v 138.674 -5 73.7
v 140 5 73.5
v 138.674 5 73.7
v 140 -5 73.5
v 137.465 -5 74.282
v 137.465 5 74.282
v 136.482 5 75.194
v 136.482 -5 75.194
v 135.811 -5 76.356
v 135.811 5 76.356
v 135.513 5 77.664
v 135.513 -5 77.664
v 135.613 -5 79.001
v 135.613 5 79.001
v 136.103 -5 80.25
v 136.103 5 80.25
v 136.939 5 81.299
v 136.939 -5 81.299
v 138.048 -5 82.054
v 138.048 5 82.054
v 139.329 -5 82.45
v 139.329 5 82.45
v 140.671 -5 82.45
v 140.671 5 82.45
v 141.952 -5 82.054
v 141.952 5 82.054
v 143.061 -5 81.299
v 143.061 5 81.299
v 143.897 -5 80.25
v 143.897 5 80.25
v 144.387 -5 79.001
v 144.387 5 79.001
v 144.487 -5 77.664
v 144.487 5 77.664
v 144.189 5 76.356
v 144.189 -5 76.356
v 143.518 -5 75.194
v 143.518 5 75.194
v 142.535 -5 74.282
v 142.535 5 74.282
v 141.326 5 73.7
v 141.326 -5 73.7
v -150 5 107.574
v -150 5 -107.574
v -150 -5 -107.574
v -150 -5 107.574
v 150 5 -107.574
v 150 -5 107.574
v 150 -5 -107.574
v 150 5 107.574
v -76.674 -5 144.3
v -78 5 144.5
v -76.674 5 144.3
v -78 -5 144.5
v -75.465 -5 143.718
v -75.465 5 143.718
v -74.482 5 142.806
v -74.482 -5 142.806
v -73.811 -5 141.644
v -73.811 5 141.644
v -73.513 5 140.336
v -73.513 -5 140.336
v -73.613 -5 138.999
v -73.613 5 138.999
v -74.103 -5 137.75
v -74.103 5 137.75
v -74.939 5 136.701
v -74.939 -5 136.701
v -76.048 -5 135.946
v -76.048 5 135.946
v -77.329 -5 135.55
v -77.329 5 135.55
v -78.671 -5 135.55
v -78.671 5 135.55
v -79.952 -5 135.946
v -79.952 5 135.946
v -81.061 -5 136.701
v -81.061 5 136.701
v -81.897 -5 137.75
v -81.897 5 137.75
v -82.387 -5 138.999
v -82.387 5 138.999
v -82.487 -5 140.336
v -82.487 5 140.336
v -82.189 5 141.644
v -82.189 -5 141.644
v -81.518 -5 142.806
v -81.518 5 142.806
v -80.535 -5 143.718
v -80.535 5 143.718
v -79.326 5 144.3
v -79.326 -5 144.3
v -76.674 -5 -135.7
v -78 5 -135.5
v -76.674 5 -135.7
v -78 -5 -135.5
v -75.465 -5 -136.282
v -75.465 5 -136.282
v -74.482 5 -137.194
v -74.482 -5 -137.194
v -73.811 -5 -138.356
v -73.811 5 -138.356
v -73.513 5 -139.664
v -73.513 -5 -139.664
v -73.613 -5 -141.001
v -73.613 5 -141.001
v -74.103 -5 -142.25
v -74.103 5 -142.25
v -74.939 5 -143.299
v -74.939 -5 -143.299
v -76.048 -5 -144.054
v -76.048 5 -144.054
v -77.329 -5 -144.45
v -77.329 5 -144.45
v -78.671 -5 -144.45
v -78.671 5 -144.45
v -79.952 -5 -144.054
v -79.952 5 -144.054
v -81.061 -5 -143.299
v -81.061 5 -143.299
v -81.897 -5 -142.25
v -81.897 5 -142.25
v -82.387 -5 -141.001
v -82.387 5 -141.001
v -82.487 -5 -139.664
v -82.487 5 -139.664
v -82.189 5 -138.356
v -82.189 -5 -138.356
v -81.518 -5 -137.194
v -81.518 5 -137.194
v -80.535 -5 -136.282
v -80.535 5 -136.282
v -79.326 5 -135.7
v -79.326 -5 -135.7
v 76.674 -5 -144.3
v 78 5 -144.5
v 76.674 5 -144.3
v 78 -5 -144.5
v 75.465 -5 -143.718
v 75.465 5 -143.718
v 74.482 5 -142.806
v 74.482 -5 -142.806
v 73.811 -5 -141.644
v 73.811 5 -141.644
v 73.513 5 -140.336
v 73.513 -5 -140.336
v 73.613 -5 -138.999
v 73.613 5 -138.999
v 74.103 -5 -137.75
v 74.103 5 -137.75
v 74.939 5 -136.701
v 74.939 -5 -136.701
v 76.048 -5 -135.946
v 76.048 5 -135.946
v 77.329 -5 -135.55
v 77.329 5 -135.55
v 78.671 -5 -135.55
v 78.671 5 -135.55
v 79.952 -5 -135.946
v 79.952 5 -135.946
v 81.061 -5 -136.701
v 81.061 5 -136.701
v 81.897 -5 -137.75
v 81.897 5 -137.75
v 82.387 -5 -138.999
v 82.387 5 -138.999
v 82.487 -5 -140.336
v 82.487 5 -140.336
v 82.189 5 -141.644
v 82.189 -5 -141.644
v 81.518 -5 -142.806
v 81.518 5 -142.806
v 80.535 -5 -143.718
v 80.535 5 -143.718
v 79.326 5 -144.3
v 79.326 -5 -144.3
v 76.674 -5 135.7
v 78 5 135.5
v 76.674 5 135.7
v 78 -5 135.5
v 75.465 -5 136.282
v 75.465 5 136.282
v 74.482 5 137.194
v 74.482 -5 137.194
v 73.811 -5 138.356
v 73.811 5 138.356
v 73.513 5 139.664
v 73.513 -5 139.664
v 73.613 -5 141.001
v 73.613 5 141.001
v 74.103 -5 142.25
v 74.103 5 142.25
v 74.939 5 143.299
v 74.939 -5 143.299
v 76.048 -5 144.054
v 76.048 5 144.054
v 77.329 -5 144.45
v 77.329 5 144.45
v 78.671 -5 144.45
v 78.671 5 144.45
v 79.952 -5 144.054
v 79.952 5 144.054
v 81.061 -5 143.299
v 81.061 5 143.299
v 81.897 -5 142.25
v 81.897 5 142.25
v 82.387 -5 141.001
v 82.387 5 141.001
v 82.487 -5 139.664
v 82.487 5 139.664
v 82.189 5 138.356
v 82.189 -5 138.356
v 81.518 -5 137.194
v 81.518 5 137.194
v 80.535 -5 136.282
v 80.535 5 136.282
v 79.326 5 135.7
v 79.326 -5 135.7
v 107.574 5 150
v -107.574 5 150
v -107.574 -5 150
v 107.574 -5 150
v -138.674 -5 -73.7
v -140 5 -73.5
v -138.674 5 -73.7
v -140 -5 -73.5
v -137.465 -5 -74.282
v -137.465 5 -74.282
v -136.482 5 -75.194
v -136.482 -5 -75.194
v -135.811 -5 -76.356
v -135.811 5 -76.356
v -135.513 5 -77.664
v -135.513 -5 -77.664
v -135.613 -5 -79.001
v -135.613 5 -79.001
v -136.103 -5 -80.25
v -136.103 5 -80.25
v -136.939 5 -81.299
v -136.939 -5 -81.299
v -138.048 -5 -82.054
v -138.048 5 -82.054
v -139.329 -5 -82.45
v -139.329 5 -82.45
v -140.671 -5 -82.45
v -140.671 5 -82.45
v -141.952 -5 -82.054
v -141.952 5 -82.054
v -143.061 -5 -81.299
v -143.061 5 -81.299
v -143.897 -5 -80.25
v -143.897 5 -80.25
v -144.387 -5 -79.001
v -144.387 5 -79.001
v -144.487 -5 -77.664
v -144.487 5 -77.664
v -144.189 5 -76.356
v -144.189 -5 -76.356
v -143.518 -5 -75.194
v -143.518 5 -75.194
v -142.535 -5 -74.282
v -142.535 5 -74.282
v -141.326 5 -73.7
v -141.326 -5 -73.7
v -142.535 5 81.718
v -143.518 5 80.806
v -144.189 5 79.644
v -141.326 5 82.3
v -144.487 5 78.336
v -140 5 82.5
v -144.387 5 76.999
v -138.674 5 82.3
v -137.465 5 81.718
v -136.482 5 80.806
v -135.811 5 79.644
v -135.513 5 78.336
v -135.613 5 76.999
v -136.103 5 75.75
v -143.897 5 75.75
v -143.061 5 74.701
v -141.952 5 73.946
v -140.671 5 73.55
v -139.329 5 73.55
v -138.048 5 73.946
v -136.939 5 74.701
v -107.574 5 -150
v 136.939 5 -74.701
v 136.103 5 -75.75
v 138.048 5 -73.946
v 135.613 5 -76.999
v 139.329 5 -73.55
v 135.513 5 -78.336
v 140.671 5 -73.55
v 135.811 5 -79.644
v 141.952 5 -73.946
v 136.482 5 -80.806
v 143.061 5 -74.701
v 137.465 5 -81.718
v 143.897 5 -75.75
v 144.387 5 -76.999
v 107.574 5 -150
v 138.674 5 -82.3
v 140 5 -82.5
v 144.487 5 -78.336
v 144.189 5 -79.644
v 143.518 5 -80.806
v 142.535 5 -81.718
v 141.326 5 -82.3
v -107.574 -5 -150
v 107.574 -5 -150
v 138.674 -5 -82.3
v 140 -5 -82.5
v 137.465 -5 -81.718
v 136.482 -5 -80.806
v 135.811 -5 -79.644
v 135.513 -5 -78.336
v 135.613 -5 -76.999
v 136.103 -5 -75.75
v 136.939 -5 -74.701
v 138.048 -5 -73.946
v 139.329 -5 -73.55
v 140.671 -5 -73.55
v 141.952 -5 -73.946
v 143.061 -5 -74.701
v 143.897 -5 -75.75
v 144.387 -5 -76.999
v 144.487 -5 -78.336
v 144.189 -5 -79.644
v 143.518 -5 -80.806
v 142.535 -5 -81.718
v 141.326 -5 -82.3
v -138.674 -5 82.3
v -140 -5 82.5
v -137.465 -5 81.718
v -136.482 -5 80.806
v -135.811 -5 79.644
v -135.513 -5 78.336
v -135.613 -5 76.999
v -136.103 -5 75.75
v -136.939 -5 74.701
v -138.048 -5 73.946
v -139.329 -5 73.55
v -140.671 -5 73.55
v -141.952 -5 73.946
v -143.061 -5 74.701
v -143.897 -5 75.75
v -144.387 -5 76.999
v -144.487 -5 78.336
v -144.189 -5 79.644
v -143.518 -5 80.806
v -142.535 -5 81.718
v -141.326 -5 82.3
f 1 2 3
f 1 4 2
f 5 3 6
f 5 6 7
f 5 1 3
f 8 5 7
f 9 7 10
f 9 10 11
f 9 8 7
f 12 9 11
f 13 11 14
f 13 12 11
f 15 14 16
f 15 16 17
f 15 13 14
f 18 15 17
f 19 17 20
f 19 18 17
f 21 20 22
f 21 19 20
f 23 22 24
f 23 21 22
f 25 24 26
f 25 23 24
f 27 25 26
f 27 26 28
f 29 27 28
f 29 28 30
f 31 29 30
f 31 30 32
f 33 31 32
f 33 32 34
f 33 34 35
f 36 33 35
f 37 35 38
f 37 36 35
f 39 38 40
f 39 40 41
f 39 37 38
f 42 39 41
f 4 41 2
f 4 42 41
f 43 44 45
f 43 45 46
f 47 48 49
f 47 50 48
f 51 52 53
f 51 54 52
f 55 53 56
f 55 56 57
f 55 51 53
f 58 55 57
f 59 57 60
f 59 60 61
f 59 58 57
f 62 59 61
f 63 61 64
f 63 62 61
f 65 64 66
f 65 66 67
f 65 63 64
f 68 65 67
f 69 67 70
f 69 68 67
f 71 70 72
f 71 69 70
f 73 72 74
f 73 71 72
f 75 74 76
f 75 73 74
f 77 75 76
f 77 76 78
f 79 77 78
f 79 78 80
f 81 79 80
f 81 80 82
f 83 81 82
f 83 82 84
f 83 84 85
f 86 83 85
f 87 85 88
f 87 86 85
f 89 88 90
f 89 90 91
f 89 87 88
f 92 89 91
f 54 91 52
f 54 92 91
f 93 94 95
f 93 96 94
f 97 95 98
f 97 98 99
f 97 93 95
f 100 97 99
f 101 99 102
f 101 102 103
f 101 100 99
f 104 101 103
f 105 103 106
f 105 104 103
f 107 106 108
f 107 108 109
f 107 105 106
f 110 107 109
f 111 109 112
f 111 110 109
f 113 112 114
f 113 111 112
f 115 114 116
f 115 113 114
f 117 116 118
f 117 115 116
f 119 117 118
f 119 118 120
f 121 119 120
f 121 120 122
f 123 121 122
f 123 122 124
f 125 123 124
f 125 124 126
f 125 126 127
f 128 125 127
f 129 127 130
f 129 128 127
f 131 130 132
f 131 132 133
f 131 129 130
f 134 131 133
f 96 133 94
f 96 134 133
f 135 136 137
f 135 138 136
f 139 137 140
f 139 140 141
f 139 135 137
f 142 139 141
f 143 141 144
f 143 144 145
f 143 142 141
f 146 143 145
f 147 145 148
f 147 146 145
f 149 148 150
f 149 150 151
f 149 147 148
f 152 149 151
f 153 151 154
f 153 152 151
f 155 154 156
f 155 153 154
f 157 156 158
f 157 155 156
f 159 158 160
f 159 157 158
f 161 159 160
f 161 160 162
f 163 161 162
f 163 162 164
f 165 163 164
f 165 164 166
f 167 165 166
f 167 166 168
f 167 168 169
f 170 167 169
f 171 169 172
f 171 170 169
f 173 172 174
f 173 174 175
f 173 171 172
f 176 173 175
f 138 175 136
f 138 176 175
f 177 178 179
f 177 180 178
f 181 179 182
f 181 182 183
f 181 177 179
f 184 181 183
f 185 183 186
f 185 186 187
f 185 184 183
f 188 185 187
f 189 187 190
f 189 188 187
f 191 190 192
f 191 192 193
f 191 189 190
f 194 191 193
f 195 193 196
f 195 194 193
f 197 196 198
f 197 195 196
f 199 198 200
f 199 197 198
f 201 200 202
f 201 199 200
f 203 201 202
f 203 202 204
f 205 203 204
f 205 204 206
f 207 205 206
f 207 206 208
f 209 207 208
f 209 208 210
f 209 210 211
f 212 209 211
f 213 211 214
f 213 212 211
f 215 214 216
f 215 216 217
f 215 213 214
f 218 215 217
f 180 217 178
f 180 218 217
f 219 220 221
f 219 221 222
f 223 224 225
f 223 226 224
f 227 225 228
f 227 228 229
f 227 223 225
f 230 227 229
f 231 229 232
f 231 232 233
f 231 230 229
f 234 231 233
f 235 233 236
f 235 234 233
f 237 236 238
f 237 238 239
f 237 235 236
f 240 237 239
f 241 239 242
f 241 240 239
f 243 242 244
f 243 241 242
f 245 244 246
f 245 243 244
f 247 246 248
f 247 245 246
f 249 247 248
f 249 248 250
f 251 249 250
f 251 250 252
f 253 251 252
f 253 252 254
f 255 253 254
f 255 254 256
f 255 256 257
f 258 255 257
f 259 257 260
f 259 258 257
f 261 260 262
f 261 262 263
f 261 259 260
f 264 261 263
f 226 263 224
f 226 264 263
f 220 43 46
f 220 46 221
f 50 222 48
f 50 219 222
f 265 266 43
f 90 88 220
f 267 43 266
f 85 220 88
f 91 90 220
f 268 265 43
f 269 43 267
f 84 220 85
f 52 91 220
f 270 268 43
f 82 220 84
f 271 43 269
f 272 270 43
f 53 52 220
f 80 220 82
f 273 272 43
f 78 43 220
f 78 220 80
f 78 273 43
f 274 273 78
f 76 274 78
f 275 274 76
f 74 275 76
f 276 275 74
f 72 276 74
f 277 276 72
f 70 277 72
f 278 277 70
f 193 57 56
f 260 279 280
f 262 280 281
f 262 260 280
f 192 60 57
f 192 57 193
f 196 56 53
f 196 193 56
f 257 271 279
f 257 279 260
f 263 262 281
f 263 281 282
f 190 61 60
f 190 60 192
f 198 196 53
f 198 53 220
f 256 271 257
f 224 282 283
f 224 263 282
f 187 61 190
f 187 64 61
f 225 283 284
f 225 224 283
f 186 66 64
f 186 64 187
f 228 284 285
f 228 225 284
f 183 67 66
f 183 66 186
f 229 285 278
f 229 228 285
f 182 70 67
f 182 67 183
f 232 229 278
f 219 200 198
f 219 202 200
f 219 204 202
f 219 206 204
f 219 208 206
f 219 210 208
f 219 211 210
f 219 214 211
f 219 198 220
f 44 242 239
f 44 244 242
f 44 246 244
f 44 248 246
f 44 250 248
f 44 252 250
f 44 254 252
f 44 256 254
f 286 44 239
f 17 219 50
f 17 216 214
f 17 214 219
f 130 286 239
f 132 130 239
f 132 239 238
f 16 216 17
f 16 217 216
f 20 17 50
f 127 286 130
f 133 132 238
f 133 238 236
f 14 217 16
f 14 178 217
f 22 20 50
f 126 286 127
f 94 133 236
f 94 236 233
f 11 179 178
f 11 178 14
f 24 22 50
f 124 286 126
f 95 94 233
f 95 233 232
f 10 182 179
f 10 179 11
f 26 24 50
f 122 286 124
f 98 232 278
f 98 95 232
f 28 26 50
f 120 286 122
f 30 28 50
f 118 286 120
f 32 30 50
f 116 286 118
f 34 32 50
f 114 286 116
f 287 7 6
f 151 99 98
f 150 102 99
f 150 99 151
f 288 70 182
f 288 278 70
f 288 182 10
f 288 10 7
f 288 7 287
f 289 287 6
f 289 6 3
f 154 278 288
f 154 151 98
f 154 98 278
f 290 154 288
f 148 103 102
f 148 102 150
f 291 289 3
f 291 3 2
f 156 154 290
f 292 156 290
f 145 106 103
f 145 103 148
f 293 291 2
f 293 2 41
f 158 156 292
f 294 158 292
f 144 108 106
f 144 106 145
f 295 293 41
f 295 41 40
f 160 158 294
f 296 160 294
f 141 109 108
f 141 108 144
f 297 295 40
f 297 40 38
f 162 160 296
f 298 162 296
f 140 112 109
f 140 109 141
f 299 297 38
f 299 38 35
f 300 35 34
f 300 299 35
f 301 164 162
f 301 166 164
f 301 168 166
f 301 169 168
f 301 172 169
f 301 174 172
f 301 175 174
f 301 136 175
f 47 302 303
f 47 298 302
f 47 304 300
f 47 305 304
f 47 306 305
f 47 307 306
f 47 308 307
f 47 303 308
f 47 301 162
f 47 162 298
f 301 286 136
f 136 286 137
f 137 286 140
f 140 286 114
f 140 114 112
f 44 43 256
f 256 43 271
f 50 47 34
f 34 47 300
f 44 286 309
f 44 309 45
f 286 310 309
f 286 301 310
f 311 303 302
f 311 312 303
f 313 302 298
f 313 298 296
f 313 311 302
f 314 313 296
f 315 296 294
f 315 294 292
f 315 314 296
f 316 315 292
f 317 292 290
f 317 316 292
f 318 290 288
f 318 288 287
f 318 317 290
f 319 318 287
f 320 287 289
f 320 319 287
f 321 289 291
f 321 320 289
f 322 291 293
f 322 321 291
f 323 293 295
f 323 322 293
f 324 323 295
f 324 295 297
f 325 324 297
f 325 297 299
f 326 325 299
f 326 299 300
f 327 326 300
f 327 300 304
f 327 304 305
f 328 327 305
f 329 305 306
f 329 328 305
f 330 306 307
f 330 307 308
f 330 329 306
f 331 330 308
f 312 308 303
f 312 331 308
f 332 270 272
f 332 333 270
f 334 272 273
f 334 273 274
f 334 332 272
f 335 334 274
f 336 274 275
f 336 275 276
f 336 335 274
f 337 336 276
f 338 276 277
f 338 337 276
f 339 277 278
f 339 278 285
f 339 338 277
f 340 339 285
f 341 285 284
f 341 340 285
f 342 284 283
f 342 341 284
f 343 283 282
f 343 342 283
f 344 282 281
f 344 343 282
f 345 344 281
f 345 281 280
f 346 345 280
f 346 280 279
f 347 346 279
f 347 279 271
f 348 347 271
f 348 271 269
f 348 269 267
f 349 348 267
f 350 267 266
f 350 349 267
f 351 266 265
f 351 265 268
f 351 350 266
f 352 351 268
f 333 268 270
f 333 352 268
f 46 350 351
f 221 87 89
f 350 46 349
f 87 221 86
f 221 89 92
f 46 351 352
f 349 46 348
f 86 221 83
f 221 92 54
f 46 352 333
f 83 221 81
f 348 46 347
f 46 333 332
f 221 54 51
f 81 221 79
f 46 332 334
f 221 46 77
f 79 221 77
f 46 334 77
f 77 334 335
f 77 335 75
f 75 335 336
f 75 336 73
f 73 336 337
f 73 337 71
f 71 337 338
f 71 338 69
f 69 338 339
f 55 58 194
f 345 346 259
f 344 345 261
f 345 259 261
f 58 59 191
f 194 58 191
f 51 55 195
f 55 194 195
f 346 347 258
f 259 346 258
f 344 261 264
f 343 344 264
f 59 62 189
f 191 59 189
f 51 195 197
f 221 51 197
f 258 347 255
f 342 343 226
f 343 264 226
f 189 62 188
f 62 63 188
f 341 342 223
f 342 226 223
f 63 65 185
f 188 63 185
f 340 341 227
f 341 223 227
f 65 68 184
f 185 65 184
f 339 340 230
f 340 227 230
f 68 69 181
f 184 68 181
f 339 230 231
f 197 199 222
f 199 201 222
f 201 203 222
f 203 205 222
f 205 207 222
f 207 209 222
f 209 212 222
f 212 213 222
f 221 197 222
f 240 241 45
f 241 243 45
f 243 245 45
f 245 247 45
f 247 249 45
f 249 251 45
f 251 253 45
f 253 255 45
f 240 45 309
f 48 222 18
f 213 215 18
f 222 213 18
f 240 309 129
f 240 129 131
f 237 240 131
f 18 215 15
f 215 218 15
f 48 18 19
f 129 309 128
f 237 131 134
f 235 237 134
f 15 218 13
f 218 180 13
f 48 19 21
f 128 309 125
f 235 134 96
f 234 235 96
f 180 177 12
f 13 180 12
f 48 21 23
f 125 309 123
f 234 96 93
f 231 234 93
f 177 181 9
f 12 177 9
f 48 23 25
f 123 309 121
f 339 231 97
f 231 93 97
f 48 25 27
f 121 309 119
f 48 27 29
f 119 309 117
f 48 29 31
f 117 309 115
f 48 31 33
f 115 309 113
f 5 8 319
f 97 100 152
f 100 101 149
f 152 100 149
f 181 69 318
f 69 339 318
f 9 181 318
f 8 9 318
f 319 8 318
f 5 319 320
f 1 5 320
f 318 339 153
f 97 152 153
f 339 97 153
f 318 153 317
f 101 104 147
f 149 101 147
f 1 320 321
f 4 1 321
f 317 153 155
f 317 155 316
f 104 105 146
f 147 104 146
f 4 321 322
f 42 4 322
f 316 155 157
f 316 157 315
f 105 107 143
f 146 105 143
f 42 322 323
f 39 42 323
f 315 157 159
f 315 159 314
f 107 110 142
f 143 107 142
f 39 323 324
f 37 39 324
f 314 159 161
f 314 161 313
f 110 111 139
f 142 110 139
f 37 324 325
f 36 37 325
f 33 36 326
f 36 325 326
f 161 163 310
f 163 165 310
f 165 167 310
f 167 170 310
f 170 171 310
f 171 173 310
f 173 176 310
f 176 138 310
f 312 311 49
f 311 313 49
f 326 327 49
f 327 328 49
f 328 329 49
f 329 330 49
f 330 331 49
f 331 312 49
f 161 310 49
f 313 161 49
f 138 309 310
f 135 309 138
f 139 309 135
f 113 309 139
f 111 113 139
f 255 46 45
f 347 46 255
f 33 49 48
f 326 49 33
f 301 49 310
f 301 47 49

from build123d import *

# Parameters (mm, degrees)
SKETCH2_R           = 4.5
BOSS_EXTRUDE1_DEPTH = 5


with BuildPart() as part:
    # Sketch2 → Boss-Extrude1 (new, symmetric)
    with BuildSketch(Plane(origin=(0, 0, 0), x_dir=(1, 0, 0), z_dir=(0, 1, 0))):
        Polygon((107.573593129, 150), (-107.573593129, 150), (-150, 107.573593129), (-150, -107.573593129), (-107.573593129, -150), (107.573593129, -150), (150, -107.573593129), (150, 107.573593129), align=None)
        with Locations(Location((-78, 140, 0), (0, 0, 270))):
            Circle(SKETCH2_R, mode=Mode.SUBTRACT)
        with Locations(Location((78, 140, 0), (0, 0, 90))):
            Circle(SKETCH2_R, mode=Mode.SUBTRACT)
        with Locations(Location((-140, 78, 0), (0, 0, 270))):
            Circle(SKETCH2_R, mode=Mode.SUBTRACT)
        with Locations(Location((140, 78, 0), (0, 0, 90))):
            Circle(SKETCH2_R, mode=Mode.SUBTRACT)
        with Locations(Location((-140, -78, 0), (0, 0, 270))):
            Circle(SKETCH2_R, mode=Mode.SUBTRACT)
        with Locations(Location((140, -78, 0), (0, 0, 90))):
            Circle(SKETCH2_R, mode=Mode.SUBTRACT)
        with Locations(Location((-78, -140, 0), (0, 0, 270))):
            Circle(SKETCH2_R, mode=Mode.SUBTRACT)
        with Locations(Location((78, -140, 0), (0, 0, 90))):
            Circle(SKETCH2_R, mode=Mode.SUBTRACT)
    extrude(amount=BOSS_EXTRUDE1_DEPTH, both=True)


solid = part.part
